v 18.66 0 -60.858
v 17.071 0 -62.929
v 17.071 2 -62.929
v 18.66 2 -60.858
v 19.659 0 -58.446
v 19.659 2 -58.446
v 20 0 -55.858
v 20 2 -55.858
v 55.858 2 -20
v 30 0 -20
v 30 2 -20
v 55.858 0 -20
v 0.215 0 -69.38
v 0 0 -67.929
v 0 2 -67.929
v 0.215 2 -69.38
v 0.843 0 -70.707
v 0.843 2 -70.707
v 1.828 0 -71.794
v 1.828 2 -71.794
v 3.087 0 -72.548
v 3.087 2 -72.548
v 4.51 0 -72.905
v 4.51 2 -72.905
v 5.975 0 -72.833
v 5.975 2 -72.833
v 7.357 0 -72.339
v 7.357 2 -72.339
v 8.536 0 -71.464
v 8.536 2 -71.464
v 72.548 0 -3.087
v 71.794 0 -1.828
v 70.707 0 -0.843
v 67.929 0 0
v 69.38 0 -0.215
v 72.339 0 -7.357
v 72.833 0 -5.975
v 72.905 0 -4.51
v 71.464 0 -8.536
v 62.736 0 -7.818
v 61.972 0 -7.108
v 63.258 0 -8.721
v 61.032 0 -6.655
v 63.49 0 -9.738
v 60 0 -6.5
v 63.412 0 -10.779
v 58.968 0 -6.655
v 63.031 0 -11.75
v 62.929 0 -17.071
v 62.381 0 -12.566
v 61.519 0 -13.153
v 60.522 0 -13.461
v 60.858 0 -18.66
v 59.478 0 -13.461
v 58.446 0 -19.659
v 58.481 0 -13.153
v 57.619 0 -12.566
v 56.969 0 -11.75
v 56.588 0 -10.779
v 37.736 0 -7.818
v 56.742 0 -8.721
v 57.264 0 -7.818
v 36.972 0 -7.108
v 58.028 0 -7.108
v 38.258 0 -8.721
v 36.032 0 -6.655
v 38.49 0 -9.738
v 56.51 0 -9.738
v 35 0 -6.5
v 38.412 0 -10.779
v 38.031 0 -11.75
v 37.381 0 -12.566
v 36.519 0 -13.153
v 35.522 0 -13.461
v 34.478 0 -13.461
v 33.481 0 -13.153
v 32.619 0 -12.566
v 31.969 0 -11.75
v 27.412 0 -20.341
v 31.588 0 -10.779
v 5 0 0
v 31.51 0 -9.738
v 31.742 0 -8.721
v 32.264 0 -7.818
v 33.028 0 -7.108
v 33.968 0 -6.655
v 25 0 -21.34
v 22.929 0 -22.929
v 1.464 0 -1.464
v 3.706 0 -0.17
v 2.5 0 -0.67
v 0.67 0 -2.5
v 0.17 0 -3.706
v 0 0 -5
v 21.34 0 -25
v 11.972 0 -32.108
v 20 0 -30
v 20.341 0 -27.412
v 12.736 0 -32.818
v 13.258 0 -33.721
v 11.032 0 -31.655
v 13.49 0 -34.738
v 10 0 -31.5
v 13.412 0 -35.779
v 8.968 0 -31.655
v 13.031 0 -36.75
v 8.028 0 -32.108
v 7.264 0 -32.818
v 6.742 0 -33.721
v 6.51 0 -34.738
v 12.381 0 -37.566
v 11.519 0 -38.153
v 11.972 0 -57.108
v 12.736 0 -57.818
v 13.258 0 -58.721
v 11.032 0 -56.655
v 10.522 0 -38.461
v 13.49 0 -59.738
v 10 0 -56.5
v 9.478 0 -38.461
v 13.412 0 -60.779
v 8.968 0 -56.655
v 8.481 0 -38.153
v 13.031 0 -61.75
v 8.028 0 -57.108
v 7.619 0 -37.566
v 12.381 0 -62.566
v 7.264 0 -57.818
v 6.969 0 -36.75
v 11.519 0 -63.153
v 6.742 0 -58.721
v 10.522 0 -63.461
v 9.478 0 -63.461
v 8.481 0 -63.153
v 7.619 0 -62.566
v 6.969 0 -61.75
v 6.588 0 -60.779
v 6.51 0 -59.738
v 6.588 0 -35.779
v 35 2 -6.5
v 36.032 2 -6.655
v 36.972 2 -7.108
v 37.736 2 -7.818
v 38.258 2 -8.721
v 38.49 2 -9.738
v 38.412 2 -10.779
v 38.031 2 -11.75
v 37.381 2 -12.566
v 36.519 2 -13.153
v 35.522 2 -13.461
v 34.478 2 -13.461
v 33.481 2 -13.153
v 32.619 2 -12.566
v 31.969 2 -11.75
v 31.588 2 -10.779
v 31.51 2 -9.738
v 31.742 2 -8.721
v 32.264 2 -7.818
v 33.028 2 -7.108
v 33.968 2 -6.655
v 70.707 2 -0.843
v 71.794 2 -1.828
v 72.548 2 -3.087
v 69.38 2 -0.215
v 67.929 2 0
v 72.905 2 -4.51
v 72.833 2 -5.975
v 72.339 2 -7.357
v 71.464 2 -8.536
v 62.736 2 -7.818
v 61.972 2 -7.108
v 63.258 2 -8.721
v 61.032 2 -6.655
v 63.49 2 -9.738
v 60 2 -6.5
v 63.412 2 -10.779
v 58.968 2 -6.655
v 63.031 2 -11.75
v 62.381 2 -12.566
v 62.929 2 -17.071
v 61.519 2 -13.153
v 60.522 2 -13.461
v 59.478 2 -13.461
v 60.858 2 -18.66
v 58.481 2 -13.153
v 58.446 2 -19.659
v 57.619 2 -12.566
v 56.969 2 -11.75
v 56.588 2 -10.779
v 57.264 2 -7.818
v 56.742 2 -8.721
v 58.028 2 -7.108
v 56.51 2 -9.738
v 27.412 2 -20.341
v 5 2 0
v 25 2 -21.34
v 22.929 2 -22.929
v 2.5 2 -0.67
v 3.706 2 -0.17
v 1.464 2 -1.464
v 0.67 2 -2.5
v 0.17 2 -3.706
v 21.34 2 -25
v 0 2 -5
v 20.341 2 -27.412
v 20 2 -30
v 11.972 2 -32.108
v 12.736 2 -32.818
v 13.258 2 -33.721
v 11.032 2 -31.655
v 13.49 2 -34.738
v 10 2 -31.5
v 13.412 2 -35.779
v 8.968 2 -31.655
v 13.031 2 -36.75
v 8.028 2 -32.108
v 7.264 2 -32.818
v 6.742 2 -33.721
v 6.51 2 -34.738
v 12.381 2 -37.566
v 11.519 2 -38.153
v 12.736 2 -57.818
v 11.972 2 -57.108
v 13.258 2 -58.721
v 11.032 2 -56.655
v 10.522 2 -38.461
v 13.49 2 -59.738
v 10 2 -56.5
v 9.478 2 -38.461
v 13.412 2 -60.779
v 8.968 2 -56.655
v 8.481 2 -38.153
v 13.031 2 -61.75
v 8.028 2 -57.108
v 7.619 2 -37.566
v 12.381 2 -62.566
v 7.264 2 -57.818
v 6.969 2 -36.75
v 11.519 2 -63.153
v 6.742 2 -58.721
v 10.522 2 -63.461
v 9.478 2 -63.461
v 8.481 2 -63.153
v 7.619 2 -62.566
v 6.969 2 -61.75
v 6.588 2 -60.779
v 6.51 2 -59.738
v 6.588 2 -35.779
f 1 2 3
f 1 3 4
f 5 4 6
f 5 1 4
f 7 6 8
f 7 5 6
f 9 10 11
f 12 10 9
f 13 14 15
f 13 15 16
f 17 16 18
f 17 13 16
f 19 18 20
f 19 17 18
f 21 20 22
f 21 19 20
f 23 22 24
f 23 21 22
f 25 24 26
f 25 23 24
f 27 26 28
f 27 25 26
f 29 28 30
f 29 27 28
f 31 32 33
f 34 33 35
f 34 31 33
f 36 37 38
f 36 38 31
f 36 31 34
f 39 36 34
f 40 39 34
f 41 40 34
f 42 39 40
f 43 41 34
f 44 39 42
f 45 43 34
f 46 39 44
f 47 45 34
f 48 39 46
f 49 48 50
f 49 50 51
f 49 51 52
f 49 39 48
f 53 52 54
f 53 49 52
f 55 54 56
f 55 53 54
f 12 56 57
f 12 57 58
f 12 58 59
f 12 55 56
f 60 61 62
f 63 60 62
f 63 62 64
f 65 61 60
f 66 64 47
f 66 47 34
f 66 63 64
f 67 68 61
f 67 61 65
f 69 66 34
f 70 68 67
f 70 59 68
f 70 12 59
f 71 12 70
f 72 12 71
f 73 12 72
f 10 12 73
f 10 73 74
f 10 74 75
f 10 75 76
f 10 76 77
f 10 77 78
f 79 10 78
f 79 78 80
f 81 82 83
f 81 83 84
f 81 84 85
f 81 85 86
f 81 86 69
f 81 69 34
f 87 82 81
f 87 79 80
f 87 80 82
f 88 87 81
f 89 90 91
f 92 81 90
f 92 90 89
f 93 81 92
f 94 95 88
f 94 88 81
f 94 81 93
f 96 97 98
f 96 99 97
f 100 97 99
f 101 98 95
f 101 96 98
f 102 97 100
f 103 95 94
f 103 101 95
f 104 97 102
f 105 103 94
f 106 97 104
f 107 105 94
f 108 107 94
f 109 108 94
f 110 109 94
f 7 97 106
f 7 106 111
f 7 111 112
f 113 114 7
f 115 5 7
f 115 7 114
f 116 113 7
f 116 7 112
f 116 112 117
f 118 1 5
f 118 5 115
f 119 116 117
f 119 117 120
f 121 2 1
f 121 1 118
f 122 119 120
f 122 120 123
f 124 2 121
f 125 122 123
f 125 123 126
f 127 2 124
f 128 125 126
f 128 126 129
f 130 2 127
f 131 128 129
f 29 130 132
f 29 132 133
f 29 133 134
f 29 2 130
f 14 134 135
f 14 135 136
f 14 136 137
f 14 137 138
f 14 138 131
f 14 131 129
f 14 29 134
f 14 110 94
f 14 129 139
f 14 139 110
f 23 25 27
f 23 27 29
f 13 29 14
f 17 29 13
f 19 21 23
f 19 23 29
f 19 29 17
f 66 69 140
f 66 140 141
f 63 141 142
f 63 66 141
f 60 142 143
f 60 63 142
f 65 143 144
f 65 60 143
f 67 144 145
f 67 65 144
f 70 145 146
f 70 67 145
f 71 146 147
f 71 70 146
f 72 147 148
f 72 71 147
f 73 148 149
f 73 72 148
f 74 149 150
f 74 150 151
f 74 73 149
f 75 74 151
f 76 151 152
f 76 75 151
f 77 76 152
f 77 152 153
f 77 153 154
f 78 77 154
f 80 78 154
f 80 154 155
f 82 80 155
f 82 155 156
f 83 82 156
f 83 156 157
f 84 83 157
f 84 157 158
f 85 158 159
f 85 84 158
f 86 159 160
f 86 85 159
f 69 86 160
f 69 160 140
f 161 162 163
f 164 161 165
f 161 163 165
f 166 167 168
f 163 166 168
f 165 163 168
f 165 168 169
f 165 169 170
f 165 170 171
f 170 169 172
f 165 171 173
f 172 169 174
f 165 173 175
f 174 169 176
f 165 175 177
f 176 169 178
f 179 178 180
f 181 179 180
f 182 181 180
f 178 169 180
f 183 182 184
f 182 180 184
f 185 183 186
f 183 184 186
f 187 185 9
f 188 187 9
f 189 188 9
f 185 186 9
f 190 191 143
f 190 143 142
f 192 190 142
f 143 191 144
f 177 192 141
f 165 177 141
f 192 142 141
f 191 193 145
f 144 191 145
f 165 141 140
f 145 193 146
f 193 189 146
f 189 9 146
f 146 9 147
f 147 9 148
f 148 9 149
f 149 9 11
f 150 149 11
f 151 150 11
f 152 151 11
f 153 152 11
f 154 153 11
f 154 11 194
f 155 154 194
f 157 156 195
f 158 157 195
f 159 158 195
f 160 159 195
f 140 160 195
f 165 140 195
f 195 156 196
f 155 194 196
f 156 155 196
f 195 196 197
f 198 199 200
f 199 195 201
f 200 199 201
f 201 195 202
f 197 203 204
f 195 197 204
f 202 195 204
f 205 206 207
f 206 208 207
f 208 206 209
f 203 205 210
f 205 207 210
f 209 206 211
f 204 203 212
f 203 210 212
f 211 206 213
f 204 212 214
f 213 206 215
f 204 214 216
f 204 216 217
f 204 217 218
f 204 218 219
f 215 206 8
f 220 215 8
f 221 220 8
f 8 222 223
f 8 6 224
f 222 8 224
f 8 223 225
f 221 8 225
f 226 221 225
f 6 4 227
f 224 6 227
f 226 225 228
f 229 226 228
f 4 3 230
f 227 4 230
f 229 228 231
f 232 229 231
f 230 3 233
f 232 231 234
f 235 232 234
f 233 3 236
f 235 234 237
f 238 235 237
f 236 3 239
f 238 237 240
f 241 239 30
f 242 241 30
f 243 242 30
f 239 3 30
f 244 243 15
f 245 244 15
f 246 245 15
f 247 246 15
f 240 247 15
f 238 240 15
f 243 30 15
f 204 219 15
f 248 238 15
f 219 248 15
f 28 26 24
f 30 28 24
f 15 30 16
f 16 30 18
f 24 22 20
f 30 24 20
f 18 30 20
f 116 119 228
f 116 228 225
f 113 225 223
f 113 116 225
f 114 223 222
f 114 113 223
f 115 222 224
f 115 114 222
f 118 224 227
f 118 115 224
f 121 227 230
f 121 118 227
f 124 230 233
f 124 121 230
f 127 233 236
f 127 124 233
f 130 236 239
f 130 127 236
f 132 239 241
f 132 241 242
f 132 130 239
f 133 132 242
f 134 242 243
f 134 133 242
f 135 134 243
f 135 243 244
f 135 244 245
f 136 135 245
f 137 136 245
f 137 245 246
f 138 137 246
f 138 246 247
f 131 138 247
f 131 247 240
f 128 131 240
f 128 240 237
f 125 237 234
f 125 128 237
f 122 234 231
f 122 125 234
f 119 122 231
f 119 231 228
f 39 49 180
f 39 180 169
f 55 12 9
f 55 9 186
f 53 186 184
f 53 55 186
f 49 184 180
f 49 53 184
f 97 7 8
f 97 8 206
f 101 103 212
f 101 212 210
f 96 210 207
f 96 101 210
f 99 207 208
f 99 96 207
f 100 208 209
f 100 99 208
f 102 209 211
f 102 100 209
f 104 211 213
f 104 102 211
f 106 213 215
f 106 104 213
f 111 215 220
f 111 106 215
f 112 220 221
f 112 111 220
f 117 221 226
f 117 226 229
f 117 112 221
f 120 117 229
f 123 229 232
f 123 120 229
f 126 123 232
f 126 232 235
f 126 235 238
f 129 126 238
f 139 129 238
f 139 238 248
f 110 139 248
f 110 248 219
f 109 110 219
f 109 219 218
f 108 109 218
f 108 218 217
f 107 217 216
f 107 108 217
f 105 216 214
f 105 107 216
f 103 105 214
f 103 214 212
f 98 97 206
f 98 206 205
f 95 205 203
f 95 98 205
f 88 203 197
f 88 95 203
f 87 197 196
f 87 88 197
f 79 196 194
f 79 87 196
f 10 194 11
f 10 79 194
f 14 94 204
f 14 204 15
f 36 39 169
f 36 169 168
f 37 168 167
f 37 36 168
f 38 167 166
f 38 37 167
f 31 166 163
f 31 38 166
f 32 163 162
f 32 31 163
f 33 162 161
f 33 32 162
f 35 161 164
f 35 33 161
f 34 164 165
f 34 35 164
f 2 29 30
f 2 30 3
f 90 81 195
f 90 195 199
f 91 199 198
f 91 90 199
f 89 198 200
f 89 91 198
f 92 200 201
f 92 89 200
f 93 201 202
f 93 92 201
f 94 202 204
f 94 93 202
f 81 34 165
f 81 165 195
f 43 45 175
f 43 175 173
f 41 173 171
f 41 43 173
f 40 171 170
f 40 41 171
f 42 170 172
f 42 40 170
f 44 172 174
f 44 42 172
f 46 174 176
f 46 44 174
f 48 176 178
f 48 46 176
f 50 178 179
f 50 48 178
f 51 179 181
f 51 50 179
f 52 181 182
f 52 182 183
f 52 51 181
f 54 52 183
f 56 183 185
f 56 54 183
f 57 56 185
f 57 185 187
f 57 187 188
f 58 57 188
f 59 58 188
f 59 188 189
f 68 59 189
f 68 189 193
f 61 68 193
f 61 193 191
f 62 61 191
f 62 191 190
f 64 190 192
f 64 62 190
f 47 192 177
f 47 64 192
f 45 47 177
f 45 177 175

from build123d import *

# Parameters (mm, degrees)
SKETCH1_R           = 3.5
BOSS_EXTRUDE1_DEPTH = 2


with BuildPart() as part:
    # Sketch1 → Boss-Extrude1 (new body)
    with BuildSketch(Plane(origin=(0, 0, 0), x_dir=(1, 0, 0), z_dir=(0, 1, 0))):
        with BuildLine():
            Line((0, 5), (0, 67.928932188))
            ThreePointArc((0, 67.928932188), (3.086582838, 72.548329851), (8.535533906, 71.464466094))
            Line((8.535533906, 71.464466094), (17.071067812, 62.928932188))
            ThreePointArc((17.071067812, 62.928932188), (19.238795325, 59.6846987), (20, 55.857864376))
            Line((20, 55.857864376), (20, 30))
            ThreePointArc((20, 30), (22.928932188, 22.928932188), (30, 20))
            Line((30, 20), (55.857864376, 20))
            ThreePointArc((55.857864376, 20), (59.6846987, 19.238795325), (62.928932188, 17.071067812))
            Line((62.928932188, 17.071067812), (71.464466094, 8.535533906))
            ThreePointArc((71.464466094, 8.535533906), (72.548329851, 3.086582838), (67.928932188, 0))
            Line((67.928932188, 0), (5, 0))
            ThreePointArc((5, 0), (1.464466094, 1.464466094), (0, 5))
        make_face()
        with Locations(Location((10, 60, 0), (0, 0, 270))):
            Circle(SKETCH1_R, mode=Mode.SUBTRACT)
        with Locations(Location((10, 35, 0), (0, 0, 270))):
            Circle(SKETCH1_R, mode=Mode.SUBTRACT)
        with Locations(Location((35, 10, 0), (0, 0, 270))):
            Circle(SKETCH1_R, mode=Mode.SUBTRACT)
        with Locations(Location((60, 10, 0), (0, 0, 270))):
            Circle(SKETCH1_R, mode=Mode.SUBTRACT)
    extrude(amount=BOSS_EXTRUDE1_DEPTH)


solid = part.part
